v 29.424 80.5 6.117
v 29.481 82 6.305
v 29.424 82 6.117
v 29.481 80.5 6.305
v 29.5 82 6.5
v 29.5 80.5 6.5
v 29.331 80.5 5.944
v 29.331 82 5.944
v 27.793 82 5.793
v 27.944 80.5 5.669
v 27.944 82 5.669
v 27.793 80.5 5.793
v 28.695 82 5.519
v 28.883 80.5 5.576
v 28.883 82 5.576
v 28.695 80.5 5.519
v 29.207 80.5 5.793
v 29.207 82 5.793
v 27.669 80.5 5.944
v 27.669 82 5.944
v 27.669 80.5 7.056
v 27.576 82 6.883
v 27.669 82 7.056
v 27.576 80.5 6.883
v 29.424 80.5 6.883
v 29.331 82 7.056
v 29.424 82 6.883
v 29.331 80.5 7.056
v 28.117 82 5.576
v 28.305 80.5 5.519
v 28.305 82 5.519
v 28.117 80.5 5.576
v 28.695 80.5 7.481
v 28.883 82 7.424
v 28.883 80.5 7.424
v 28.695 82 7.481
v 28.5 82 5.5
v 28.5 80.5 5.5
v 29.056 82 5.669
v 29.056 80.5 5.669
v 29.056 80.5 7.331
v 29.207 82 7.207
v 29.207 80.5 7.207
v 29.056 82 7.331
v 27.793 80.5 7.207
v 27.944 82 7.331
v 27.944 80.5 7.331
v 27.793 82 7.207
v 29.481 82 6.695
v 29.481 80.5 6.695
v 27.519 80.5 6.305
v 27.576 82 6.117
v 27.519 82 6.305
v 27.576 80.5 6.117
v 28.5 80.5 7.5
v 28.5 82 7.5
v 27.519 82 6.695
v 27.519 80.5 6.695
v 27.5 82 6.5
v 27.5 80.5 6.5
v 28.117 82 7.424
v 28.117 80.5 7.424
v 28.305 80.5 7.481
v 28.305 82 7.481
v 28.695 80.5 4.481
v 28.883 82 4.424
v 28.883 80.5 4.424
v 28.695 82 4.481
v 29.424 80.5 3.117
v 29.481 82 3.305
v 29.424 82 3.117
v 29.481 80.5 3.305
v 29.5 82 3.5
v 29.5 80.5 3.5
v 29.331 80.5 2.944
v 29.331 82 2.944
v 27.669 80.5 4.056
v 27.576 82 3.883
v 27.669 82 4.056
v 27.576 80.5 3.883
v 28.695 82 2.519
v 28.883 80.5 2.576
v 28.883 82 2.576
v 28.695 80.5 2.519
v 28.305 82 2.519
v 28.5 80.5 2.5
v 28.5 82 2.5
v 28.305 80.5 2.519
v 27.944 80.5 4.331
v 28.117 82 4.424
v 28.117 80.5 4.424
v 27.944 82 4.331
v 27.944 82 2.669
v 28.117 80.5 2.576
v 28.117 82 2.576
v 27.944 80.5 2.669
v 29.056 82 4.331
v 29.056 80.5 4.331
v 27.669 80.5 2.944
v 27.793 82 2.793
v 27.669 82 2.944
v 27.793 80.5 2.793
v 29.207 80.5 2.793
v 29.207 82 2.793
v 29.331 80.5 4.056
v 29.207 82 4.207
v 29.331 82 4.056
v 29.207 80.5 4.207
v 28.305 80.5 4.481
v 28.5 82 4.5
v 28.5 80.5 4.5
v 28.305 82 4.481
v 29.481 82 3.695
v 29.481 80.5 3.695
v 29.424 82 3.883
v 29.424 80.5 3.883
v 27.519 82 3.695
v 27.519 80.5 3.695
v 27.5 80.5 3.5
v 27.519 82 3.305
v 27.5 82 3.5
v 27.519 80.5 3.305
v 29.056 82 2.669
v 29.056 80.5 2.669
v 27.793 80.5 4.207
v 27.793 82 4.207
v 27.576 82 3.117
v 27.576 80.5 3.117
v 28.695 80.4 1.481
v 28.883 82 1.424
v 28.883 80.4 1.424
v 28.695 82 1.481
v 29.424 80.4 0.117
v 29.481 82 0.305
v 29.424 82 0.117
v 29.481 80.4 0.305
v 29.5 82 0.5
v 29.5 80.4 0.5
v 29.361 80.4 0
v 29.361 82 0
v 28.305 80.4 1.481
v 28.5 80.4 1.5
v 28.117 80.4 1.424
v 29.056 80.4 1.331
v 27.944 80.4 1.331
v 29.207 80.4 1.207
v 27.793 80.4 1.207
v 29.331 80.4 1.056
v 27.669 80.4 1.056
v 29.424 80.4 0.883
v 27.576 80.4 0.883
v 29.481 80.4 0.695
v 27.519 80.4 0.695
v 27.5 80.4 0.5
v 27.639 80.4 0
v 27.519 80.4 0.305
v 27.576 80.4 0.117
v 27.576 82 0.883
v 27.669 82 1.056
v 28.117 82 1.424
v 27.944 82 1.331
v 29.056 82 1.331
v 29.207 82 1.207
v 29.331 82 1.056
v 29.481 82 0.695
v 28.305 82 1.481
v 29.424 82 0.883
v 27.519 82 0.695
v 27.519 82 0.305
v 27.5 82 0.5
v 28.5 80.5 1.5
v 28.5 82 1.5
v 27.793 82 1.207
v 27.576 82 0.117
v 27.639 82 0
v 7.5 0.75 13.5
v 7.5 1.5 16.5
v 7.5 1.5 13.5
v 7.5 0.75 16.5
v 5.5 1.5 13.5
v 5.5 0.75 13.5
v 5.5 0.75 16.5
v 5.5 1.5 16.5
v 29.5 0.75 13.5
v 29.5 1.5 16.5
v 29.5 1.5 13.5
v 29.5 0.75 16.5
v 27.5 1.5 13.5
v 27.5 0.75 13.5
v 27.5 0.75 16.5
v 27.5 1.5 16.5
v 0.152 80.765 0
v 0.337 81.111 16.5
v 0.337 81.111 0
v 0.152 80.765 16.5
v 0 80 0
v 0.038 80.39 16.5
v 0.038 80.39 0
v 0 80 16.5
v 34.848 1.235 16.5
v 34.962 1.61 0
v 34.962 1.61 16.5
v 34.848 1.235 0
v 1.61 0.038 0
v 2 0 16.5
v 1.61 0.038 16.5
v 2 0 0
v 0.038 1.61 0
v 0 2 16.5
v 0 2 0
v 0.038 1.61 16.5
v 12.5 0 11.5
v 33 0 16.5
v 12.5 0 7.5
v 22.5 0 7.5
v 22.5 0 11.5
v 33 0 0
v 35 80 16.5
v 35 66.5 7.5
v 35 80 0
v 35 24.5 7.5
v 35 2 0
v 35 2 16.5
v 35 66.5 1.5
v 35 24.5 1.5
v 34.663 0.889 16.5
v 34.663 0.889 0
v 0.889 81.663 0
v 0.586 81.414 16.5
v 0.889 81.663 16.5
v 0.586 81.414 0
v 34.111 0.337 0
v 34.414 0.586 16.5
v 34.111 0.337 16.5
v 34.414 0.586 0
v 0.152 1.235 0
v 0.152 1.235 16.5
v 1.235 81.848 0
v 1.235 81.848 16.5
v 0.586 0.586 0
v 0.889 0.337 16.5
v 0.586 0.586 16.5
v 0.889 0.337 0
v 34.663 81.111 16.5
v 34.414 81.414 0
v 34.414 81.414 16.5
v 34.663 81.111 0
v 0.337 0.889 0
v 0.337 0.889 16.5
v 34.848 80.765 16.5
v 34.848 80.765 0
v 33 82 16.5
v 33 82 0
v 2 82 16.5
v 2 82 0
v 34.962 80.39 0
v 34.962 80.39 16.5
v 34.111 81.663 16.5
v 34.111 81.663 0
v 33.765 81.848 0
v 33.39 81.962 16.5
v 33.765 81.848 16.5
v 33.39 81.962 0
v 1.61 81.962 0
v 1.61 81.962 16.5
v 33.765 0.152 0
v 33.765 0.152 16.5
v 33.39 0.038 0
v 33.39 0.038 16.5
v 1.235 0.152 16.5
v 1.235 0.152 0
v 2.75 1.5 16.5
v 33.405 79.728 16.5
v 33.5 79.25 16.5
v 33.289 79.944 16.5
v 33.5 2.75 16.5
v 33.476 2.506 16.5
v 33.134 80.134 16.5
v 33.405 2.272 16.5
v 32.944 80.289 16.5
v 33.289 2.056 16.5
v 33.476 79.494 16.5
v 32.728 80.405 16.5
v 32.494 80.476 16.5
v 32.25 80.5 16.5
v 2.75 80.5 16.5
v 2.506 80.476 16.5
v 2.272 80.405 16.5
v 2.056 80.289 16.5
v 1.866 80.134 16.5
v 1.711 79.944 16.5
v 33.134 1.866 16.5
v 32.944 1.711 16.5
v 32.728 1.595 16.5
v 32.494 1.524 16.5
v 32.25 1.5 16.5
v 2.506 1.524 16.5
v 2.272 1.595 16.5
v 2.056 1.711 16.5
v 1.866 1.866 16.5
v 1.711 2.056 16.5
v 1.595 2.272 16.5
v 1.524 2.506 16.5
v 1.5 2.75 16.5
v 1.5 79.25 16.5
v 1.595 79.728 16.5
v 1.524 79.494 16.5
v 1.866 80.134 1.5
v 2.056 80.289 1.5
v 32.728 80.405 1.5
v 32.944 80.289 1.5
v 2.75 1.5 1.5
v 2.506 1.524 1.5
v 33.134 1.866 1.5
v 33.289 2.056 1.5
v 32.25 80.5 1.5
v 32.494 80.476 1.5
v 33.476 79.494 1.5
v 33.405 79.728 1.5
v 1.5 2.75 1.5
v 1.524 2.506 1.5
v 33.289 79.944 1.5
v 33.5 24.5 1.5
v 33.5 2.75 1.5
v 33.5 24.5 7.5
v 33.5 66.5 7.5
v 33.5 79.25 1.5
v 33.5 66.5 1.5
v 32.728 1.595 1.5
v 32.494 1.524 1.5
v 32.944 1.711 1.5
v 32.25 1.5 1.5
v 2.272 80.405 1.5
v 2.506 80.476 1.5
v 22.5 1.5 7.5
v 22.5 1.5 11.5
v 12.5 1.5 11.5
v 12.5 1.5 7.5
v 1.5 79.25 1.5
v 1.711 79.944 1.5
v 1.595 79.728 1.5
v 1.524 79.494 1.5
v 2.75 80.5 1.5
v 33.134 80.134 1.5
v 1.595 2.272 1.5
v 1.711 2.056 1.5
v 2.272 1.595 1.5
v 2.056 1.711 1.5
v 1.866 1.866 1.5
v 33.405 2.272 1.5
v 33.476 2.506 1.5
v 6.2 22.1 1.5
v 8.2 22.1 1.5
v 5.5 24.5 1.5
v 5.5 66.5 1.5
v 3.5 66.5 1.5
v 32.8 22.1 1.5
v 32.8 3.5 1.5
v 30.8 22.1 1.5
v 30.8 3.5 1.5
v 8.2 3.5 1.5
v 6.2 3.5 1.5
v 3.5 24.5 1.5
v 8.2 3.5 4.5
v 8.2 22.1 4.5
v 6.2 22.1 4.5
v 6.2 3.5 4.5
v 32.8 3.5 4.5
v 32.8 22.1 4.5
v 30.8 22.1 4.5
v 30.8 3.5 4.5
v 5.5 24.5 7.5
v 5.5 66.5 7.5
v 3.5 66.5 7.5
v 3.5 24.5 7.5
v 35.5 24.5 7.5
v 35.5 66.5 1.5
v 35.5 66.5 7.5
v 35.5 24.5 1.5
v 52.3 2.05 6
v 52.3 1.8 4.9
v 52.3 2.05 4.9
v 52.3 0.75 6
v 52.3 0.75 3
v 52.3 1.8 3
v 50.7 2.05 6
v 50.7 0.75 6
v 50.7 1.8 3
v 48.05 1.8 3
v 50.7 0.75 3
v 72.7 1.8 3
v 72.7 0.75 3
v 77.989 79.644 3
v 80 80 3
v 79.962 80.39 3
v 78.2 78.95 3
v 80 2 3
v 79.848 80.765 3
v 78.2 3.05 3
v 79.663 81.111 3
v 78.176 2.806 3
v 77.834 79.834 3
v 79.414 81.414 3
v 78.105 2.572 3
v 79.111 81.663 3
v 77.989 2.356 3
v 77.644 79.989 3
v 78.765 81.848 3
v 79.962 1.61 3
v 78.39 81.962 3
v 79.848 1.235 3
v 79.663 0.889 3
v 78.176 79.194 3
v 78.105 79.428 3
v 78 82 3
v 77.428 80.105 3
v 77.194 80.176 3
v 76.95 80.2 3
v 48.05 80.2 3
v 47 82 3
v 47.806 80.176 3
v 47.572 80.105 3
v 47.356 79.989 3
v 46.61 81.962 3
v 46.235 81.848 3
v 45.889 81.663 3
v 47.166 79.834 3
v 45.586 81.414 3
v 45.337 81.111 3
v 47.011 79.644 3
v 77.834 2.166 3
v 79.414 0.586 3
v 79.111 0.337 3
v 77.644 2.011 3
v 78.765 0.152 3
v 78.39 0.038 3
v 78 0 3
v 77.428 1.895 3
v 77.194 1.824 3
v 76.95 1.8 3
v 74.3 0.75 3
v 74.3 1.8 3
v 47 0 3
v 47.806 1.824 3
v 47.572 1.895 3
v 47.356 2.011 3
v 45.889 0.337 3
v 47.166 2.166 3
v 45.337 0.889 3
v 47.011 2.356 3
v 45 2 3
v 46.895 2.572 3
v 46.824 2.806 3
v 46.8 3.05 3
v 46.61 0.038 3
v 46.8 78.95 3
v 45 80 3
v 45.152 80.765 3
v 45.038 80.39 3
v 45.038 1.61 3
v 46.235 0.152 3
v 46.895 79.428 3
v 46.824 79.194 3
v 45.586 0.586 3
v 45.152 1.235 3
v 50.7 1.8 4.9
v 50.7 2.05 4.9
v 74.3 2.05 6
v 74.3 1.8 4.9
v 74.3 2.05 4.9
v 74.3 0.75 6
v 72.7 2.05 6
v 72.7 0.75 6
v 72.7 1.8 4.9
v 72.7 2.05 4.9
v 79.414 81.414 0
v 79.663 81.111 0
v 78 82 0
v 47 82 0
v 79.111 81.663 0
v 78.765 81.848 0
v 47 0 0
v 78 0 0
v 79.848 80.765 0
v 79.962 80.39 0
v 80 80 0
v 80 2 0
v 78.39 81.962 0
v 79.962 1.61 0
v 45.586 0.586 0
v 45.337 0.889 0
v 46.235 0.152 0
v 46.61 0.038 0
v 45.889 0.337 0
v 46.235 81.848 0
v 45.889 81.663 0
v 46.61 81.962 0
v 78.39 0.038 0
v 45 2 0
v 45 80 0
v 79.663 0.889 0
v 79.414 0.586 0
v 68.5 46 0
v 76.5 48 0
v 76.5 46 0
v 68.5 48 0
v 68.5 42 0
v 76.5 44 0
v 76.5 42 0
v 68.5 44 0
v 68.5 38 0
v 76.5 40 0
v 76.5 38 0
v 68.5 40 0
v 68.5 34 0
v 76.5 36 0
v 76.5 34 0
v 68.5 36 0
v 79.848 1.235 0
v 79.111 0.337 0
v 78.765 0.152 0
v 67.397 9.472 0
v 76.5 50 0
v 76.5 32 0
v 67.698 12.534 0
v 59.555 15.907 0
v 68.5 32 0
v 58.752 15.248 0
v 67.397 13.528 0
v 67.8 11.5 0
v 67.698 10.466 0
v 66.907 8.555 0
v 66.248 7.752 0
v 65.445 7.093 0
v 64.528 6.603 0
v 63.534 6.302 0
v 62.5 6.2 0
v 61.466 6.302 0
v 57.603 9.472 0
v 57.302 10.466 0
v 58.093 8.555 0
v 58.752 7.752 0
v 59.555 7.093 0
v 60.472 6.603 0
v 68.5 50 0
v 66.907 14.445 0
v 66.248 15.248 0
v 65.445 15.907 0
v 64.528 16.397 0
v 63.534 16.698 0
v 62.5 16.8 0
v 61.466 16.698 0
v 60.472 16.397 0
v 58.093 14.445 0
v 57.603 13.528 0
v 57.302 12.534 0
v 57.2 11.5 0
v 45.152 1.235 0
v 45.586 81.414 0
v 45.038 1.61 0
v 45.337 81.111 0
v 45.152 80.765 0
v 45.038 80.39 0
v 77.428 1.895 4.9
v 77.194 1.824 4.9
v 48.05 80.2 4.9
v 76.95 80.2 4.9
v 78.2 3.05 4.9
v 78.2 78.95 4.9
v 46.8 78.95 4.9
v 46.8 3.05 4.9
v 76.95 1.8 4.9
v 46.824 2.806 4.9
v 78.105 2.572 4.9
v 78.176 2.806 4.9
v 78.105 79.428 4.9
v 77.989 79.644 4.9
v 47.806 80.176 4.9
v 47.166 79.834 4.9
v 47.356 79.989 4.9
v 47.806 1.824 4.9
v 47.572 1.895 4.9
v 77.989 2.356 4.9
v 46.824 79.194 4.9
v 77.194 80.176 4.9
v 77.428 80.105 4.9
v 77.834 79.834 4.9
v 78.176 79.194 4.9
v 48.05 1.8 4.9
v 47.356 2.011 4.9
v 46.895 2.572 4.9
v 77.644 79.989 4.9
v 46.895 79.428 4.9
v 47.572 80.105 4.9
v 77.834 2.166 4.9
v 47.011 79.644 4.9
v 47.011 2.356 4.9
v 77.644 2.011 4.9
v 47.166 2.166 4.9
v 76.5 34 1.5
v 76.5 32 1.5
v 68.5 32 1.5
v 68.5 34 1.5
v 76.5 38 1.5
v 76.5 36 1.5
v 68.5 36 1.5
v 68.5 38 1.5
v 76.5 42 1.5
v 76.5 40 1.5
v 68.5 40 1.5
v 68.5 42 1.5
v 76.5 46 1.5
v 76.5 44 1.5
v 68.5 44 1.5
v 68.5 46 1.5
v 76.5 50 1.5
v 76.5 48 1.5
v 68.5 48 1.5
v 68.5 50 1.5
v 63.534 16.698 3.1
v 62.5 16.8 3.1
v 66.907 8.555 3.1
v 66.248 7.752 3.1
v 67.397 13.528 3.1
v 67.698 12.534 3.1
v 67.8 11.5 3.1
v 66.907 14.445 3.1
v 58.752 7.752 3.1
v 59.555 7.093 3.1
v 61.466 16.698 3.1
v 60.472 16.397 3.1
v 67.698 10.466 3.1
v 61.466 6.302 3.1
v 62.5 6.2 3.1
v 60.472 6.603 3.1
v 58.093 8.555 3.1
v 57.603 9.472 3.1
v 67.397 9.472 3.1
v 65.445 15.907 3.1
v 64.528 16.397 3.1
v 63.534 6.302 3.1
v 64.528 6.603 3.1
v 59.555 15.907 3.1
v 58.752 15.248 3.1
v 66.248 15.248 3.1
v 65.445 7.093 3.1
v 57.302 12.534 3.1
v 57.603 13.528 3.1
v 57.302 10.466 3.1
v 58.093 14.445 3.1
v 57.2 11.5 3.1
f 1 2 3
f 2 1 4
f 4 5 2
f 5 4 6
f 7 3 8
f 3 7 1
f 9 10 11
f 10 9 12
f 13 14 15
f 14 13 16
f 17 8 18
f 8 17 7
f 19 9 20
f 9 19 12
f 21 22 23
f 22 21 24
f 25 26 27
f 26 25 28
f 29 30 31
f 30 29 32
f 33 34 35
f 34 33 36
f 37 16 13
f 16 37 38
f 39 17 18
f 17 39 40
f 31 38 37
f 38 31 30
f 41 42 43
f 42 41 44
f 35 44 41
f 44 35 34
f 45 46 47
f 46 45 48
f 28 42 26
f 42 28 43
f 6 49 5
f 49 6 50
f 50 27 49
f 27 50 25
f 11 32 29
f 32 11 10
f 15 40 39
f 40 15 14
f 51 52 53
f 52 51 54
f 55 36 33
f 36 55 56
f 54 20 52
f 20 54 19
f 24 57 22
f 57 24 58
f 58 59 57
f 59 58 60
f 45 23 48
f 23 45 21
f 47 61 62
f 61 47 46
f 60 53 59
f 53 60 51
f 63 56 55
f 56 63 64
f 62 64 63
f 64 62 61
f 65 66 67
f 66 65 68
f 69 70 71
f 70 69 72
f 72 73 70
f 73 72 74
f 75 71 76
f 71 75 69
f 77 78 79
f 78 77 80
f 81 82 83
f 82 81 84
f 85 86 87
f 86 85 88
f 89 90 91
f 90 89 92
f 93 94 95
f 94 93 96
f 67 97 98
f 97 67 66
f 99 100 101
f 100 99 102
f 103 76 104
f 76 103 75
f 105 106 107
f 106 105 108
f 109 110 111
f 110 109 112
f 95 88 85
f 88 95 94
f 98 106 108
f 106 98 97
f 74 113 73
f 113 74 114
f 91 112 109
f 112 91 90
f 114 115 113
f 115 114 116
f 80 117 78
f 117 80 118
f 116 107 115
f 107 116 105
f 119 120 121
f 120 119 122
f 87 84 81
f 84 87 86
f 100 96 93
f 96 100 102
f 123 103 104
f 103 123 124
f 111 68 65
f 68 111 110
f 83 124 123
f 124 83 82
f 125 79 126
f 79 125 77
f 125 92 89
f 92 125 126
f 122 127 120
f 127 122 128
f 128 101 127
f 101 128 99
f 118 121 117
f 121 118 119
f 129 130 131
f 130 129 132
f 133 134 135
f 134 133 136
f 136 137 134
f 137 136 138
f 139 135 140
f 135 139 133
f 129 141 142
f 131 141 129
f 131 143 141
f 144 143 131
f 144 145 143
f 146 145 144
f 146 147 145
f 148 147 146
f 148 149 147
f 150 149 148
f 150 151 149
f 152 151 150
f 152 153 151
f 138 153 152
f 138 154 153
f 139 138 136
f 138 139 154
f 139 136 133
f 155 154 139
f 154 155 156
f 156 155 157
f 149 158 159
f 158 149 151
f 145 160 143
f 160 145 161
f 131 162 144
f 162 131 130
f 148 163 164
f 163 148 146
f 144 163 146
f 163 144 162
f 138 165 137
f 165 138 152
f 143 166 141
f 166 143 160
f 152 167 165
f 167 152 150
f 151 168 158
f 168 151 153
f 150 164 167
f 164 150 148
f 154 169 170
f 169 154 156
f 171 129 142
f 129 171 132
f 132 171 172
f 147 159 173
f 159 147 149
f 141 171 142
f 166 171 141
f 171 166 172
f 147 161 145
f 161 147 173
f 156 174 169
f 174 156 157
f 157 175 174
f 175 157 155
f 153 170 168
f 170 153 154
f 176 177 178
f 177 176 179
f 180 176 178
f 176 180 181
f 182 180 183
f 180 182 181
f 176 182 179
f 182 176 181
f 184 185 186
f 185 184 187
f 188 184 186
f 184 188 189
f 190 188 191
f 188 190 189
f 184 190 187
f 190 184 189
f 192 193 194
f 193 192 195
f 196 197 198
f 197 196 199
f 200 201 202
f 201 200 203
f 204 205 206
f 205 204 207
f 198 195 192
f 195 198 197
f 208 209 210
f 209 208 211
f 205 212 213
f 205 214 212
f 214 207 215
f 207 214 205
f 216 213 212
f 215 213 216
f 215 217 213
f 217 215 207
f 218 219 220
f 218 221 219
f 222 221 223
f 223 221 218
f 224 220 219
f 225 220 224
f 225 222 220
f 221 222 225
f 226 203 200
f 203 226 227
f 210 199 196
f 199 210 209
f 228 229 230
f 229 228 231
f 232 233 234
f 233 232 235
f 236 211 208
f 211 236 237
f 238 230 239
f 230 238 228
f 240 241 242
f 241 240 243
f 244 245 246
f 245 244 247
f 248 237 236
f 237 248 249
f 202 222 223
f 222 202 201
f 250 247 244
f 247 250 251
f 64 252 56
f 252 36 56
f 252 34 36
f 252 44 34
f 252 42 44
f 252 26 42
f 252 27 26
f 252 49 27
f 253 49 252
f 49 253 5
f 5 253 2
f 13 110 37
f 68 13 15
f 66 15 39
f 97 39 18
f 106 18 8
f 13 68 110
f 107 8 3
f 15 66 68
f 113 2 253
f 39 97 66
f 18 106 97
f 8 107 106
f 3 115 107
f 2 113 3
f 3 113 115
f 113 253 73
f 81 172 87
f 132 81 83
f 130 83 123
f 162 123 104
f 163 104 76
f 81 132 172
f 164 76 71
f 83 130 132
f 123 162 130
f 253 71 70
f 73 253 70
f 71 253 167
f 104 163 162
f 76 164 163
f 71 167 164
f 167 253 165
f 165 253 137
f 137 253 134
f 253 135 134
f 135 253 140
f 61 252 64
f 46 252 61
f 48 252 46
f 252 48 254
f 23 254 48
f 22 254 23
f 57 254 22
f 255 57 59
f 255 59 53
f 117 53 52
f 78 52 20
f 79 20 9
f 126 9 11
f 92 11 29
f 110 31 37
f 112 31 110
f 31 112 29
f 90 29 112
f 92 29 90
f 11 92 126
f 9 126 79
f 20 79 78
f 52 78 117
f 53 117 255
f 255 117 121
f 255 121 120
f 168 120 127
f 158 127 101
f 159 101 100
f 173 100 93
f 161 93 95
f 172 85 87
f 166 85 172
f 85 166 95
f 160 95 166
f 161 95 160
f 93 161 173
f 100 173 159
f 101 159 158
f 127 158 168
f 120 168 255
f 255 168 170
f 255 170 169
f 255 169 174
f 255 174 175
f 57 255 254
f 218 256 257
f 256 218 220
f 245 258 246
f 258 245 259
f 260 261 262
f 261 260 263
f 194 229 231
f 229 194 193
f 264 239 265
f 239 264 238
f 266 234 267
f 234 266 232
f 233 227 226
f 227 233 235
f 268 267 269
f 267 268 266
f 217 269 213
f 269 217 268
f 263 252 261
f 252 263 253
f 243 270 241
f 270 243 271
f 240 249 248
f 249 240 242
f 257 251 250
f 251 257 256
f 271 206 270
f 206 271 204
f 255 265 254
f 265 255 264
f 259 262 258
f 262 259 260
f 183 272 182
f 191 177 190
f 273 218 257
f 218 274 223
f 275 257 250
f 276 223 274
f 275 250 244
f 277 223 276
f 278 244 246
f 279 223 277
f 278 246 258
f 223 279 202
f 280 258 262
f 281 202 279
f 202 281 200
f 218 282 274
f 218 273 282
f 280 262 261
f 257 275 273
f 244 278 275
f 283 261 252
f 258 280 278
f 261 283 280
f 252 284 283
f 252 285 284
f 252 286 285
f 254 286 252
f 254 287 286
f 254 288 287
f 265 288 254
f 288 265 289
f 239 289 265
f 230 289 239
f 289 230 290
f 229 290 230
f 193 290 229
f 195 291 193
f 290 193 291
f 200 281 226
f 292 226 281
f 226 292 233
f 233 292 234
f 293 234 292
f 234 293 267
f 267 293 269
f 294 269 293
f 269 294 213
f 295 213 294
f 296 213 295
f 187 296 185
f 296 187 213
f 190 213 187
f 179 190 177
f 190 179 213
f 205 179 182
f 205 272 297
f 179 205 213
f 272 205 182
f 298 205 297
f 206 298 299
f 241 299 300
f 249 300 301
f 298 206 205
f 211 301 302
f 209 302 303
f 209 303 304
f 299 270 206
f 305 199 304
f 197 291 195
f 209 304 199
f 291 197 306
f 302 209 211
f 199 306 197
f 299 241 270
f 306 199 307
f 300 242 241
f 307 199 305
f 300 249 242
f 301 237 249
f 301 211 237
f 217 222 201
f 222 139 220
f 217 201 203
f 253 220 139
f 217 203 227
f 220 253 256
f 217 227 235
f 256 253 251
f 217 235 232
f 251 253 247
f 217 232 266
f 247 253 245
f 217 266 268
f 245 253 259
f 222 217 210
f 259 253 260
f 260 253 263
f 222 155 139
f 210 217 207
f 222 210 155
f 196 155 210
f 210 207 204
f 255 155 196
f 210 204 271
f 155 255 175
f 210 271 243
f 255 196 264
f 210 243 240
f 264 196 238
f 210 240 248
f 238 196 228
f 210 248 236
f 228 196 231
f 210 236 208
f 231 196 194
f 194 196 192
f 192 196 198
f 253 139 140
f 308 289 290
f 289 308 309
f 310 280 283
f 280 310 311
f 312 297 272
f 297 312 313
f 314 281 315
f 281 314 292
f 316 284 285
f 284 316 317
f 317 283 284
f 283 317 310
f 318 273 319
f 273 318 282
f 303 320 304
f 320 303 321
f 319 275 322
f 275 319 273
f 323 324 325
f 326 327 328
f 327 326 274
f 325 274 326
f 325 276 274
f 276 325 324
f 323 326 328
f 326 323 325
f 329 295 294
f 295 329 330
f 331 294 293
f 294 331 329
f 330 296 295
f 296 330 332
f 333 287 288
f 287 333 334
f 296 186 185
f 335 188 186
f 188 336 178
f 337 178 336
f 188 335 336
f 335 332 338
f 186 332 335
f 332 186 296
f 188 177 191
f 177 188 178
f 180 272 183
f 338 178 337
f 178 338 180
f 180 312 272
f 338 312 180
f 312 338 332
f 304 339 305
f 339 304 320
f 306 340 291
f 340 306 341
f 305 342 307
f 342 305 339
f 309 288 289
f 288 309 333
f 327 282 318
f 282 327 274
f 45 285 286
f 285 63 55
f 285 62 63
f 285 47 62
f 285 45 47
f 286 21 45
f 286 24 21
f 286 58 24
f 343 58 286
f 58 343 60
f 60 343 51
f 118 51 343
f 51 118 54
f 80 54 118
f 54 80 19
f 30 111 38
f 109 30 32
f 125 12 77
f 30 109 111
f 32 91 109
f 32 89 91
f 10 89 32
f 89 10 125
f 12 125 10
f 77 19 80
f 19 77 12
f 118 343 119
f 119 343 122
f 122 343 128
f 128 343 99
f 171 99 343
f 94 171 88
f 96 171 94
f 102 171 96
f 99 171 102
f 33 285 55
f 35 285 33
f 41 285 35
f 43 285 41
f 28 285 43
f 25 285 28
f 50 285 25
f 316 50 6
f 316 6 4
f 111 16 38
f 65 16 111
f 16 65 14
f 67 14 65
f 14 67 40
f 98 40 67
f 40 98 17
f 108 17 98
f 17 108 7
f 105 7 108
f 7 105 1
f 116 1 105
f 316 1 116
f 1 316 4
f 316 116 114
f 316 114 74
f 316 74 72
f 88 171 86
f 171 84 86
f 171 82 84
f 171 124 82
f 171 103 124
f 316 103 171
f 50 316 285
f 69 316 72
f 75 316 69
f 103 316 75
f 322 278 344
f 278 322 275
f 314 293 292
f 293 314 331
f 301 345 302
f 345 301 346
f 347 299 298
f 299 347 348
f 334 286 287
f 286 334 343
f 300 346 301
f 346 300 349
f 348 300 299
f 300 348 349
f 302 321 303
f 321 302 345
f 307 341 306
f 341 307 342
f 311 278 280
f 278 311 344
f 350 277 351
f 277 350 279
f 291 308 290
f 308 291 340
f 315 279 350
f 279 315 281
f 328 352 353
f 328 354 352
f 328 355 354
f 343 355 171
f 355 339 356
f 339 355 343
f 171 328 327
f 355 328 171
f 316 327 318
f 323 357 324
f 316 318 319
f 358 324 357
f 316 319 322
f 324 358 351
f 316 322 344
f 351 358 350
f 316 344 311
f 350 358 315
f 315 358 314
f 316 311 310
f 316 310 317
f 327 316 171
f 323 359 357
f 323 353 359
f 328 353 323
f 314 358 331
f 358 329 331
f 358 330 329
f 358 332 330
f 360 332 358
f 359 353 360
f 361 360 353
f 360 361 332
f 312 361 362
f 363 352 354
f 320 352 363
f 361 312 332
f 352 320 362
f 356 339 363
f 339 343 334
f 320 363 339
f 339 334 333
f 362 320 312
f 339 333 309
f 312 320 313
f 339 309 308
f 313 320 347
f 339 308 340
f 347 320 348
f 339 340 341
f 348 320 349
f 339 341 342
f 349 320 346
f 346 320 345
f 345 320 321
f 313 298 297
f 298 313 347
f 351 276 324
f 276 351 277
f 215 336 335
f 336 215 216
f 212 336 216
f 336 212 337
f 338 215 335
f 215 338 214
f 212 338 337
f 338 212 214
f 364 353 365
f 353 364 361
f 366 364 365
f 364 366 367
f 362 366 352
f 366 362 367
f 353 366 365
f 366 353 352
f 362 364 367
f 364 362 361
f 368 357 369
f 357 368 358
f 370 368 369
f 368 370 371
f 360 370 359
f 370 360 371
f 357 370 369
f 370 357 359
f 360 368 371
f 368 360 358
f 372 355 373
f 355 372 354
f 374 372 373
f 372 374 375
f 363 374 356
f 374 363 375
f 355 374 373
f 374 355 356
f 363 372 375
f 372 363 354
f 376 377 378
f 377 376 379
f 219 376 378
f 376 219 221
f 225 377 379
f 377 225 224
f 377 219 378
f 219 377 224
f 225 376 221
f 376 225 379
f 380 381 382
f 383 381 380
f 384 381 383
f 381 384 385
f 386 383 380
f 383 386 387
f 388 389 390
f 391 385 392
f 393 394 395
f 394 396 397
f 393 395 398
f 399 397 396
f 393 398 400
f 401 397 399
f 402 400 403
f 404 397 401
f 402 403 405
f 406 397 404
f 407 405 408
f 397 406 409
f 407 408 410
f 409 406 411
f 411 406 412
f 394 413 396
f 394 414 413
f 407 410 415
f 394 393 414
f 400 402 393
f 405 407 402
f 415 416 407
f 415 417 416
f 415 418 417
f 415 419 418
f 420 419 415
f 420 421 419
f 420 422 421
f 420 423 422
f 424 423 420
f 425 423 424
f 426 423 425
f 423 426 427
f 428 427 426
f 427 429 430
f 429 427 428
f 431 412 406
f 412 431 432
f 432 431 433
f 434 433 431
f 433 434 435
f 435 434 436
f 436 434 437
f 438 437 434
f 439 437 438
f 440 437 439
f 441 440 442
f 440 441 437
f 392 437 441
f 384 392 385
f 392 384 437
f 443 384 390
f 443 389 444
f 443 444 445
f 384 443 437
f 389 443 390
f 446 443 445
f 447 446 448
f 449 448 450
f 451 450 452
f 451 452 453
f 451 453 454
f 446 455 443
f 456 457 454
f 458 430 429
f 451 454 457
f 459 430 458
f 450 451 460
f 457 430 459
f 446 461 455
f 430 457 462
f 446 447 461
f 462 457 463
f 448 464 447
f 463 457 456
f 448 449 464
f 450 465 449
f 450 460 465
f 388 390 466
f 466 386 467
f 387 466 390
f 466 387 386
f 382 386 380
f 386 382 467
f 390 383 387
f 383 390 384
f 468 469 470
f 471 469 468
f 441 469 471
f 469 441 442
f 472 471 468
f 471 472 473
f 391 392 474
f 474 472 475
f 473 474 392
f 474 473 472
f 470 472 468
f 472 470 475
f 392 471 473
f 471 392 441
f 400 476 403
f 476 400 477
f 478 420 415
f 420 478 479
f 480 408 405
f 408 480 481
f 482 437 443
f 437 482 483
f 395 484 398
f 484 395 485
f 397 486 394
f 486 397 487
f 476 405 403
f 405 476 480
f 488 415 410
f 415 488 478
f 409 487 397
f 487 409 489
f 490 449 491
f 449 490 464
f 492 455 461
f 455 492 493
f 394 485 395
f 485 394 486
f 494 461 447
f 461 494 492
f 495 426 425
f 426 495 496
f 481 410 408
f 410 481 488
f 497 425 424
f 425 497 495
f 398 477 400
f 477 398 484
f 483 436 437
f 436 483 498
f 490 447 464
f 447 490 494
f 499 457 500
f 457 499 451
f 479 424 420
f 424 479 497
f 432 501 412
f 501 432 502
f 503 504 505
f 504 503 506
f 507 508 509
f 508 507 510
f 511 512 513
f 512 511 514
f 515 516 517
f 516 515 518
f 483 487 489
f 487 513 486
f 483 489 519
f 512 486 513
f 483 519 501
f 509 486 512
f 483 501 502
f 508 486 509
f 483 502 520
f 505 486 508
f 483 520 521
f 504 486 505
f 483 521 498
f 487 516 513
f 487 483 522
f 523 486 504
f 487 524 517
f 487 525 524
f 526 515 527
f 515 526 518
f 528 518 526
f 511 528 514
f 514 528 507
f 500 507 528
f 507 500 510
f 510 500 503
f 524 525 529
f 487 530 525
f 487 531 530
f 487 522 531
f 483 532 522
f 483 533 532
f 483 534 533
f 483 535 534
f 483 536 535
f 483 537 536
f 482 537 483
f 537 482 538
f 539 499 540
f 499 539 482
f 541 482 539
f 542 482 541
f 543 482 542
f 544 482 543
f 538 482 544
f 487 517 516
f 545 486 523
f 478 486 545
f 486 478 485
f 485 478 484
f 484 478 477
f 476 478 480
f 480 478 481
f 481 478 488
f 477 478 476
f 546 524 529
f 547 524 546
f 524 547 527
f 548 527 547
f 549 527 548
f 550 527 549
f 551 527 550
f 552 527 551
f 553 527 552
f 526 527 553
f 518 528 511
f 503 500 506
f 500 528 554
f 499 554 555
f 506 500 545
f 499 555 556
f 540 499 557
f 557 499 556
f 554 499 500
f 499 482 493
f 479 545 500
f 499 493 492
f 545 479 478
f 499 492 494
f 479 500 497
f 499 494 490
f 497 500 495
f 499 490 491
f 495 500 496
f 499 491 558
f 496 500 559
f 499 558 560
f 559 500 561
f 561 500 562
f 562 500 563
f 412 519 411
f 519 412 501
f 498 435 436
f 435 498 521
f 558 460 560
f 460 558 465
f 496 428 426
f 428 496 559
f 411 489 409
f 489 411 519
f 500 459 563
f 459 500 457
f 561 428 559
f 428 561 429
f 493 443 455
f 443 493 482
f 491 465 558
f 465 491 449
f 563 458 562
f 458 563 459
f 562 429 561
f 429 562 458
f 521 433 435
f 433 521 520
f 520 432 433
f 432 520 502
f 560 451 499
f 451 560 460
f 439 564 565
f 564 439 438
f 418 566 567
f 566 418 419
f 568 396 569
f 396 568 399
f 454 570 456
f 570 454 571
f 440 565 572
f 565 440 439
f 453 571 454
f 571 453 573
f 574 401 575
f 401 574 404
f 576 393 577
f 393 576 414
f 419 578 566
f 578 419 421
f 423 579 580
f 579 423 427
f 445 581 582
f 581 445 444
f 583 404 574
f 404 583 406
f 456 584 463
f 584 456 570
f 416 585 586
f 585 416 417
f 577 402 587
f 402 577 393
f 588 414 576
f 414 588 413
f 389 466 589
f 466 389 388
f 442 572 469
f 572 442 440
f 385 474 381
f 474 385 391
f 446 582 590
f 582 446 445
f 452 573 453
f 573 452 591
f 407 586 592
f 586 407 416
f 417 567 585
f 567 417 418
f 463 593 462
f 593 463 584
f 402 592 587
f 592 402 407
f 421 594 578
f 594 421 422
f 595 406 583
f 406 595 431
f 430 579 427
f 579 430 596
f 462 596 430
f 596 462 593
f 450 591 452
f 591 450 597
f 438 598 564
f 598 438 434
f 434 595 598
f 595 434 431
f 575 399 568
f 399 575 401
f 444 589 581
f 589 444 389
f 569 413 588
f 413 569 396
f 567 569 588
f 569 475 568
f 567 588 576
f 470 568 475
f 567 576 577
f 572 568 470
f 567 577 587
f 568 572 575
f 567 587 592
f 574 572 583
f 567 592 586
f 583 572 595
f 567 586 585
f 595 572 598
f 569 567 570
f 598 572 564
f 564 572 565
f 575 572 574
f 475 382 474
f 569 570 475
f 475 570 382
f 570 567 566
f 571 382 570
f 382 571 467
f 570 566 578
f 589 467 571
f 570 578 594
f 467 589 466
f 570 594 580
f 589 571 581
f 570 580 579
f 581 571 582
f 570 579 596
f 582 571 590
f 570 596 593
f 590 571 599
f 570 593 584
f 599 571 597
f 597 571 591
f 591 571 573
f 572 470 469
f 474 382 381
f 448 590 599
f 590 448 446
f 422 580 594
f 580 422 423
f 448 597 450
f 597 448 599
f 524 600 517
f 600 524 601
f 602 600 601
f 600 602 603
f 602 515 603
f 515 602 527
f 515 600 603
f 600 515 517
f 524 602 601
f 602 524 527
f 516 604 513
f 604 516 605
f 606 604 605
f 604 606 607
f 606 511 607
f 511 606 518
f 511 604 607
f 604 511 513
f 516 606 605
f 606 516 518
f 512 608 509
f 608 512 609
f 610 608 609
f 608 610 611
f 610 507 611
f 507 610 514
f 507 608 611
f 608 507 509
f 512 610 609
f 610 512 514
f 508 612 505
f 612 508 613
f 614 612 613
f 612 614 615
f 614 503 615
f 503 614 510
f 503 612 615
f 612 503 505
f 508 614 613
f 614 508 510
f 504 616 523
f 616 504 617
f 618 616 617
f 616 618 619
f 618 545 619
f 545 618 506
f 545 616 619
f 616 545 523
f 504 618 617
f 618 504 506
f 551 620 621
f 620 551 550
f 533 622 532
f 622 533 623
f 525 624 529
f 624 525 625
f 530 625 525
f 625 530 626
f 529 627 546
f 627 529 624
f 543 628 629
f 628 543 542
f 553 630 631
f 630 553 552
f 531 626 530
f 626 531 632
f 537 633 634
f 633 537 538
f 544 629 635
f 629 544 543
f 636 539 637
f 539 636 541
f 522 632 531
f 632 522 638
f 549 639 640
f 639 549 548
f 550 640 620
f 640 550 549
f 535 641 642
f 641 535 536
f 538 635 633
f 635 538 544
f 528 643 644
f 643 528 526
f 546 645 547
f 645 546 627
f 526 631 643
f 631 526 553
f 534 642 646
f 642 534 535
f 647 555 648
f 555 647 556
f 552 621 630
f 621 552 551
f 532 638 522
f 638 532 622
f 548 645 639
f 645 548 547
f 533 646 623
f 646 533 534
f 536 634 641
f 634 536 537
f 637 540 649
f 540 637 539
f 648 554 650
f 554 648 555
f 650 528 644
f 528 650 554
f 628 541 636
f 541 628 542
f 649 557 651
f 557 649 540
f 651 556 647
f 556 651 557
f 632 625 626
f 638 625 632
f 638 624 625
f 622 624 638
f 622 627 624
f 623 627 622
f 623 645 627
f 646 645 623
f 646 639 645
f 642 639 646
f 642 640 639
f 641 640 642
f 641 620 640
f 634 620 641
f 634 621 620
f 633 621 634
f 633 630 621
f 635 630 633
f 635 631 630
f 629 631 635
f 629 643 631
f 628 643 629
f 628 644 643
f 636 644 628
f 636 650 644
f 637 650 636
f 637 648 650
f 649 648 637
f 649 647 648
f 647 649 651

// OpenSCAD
// LifeOps Multi-Sensor Case
// For ESP32-C3 Super Mini + BME280 + AM312 PIR + LiPo battery
// Designed for minimal size and 3D printing

// Dimensions (mm)
esp32_width = 22;
esp32_length = 18;
esp32_height = 5;

bme280_width = 13;
bme280_length = 11;
bme280_height = 3;

pir_diameter = 10;
pir_height = 23;
pir_lens_diameter = 8;

battery_width = 30;
battery_length = 40;
battery_height = 5;

tp4056_width = 26;
tp4056_length = 17;
tp4056_height = 4;

// Case parameters
wall_thickness = 1.5;
corner_radius = 2;
tolerance = 0.3;

// Calculated case dimensions
case_internal_width = max(esp32_width, battery_width) + 2;
case_internal_length = esp32_length + battery_length + tp4056_length + 4;
case_internal_height = max(battery_height + esp32_height, pir_height - 10) + 2;

case_width = case_internal_width + 2 * wall_thickness;
case_length = case_internal_length + 2 * wall_thickness;
case_height = case_internal_height + 2 * wall_thickness;

// Quality
$fn = 32;

echo("Case dimensions:", case_width, "x", case_length, "x", case_height, "mm");

module rounded_box(w, l, h, r) {
    hull() {
        for (x = [r, w - r]) {
            for (y = [r, l - r]) {
                translate([x, y, 0])
                    cylinder(h = h, r = r);
            }
        }
    }
}

module case_bottom() {
    difference() {
        // Outer shell
        rounded_box(case_width, case_length, case_height - wall_thickness, corner_radius);

        // Inner cavity
        translate([wall_thickness, wall_thickness, wall_thickness])
            rounded_box(
                case_internal_width,
                case_internal_length,
                case_internal_height + 1,
                corner_radius - wall_thickness/2
            );

        // PIR lens hole (top)
        translate([case_width / 2, wall_thickness + 10, case_height - wall_thickness - 0.1])
            cylinder(d = pir_lens_diameter + tolerance * 2, h = wall_thickness + 0.2);

        // BME280 ventilation holes (side)
        translate([wall_thickness + case_internal_width - 5, case_length - wall_thickness - 0.1, wall_thickness + 5])
            rotate([-90, 0, 0])
                for (i = [0:2]) {
                    translate([0, i * 3, 0])
                        cylinder(d = 2, h = wall_thickness + 0.2);
                }

        // USB port cutout
        translate([case_width / 2 - 5, -0.1, wall_thickness + battery_height + 1])
            cube([10, wall_thickness + 0.2, 4]);

        // Lid snap clips (indents)
        for (x = [wall_thickness + 5, case_width - wall_thickness - 5]) {
            translate([x - 1, wall_thickness / 2, case_height - wall_thickness - 3])
                cube([2, wall_thickness, 3.5]);
        }
    }

    // Internal component supports
    // ESP32 holder
    translate([wall_thickness + (case_internal_width - esp32_width) / 2 - tolerance,
               wall_thickness + 2,
               wall_thickness]) {
        // Rails
        cube([2, esp32_length + tolerance * 2, 3]);
        translate([esp32_width + tolerance * 2 + 2, 0, 0])
            cube([2, esp32_length + tolerance * 2, 3]);
    }

    // Battery holder walls
    translate([wall_thickness + 2,
               wall_thickness + esp32_length + 5,
               wall_thickness]) {
        cube([2, battery_length + 2, battery_height + 1]);
        translate([battery_width, 0, 0])
            cube([2, battery_length + 2, battery_height + 1]);
    }
}

module case_lid() {
    // Lid thickness
    lid_height = wall_thickness * 2;

    difference() {
        union() {
            // Main lid
            rounded_box(case_width, case_length, lid_height, corner_radius);

            // Inner lip
            translate([wall_thickness + tolerance, wall_thickness + tolerance, lid_height - 0.1])
                rounded_box(
                    case_internal_width - tolerance * 2,
                    case_internal_length - tolerance * 2,
                    2,
                    corner_radius - wall_thickness/2
                );

            // Snap clips
            for (x = [wall_thickness + 5, case_width - wall_thickness - 5]) {
                translate([x - 0.8, wall_thickness / 2, lid_height])
                    cube([1.6, wall_thickness - 0.2, 3]);
            }
        }

        // PIR dome opening
        translate([case_width / 2, wall_thickness + 10, -0.1])
            cylinder(d = pir_diameter + tolerance * 2, h = lid_height + 0.2);

        // Ventilation slots
        translate([case_width / 2 + 10, case_length / 2, -0.1])
            for (i = [-2:2]) {
                translate([0, i * 4, 0])
                    cube([8, 2, lid_height + 0.2], center = true);
            }
    }
}

// Render parts
// Bottom case
case_bottom();

// Lid (offset for printing)
translate([case_width + 10, 0, 0])
    case_lid();
